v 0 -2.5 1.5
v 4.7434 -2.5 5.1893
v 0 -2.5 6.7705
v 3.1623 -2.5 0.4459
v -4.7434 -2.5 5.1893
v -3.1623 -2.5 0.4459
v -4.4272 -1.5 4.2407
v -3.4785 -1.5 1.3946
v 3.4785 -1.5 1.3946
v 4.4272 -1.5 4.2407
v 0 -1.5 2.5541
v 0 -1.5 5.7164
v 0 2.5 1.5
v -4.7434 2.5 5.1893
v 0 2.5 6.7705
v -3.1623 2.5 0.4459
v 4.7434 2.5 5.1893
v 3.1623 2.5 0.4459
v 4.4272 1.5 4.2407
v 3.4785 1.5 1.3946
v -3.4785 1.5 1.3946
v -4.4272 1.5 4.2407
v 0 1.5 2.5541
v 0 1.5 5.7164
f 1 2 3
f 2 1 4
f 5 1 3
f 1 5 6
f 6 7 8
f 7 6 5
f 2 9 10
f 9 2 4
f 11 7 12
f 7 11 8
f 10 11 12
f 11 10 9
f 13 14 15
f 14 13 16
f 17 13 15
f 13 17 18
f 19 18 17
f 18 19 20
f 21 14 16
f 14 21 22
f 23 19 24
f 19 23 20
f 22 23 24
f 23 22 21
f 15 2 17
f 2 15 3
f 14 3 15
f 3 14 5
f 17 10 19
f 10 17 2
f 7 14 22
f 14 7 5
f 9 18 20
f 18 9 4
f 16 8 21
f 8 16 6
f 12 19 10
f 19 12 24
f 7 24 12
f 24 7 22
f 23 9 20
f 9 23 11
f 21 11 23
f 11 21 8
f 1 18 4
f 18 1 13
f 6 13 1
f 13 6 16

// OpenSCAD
// file: s/u7038s01.scad
use <../../lib.scad>
function ldraw_lib__s__u7038s01() = [
// 0 ~Modulex Brick Angled 18  2 x  X Double - End
// 0 Name: s\u7038s01.dat
// 0 Author: Magnus Forsberg [MagFors]
// 0 !LDRAW_ORG Subpart UPDATE 2025-09
// 0 !LICENSE Licensed under CC BY 4.0 : see CAreadme.txt
// 
// 0 BFC CERTIFY CCW
  [0,"BFC","CERTIFY"],
  [0,"BFC","CCW"],
// 
// 0 !HISTORY 2025-09-29 [OrionP] Official Update 2025-09
// 
// 4 16 0 -16.9262 0 0 -3.75 0 7.905708 -1.114818 0 11.858545 -12.973363 0
  [4,16,0,-16.9262,0,0,-3.75,0,7.905708,-1.114818,0,11.858545,-12.973363,0],
// 4 16 -7.905708 -1.114818 0 0 -3.75 0 0 -16.9262 0 -11.858545 -12.973363 0
  [4,16,-7.905708,-1.114818,0,0,-3.75,0,0,-16.9262,0,-11.858545,-12.973363,0],
// 4 16 -11.067977 -10.601654 2.5 -8.696275 -3.486527 2.5 -7.905708 -1.114818 0 -11.858545 -12.973363 0
  [4,16,-11.067977,-10.601654,2.5,-8.696275,-3.486527,2.5,-7.905708,-1.114818,0,-11.858545,-12.973363,0],
// 4 16 7.905708 -1.114818 0 8.696275 -3.486527 2.5 11.067977 -10.601654 2.5 11.858545 -12.973363 0
  [4,16,7.905708,-1.114818,0,8.696275,-3.486527,2.5,11.067977,-10.601654,2.5,11.858545,-12.973363,0],
// 4 16 -11.067977 -10.601654 2.5 0 -14.290969 2.5 0 -6.385277 2.5 -8.696275 -3.486527 2.5
  [4,16,-11.067977,-10.601654,2.5,0,-14.290969,2.5,0,-6.385277,2.5,-8.696275,-3.486527,2.5],
// 4 16 0 -6.385277 2.5 0 -14.290969 2.5 11.067977 -10.601654 2.5 8.696275 -3.486527 2.5
  [4,16,0,-6.385277,2.5,0,-14.290969,2.5,11.067977,-10.601654,2.5,8.696275,-3.486527,2.5],
// 2 24 8.696275 -3.486527 2.5 11.067977 -10.601654 2.5
  [2,24,8.696275,-3.486527,2.5,11.067977,-10.601654,2.5],
// 2 24 -11.858545 -12.973363 0 -7.905708 -1.114818 0
  [2,24,-11.858545,-12.973363,0,-7.905708,-1.114818,0],
// 2 24 11.858545 -12.973363 0 7.905708 -1.114818 0
  [2,24,11.858545,-12.973363,0,7.905708,-1.114818,0],
// 2 24 7.905708 -1.114818 0 0 -3.75 0
  [2,24,7.905708,-1.114818,0,0,-3.75,0],
// 2 24 0 -6.385277 2.5 8.696275 -3.486527 2.5
  [2,24,0,-6.385277,2.5,8.696275,-3.486527,2.5],
// 2 24 0 -14.290969 2.5 -11.067977 -10.601654 2.5
  [2,24,0,-14.290969,2.5,-11.067977,-10.601654,2.5],
// 2 24 -8.696275 -3.486527 2.5 0 -6.385277 2.5
  [2,24,-8.696275,-3.486527,2.5,0,-6.385277,2.5],
// 2 24 -7.905708 -1.114818 0 0 -3.75 0
  [2,24,-7.905708,-1.114818,0,0,-3.75,0],
// 2 24 0 -14.290969 2.5 11.067977 -10.601654 2.5
  [2,24,0,-14.290969,2.5,11.067977,-10.601654,2.5],
// 2 24 0 -16.9262 0 -11.858545 -12.973363 0
  [2,24,0,-16.9262,0,-11.858545,-12.973363,0],
// 2 24 -8.696275 -3.486527 2.5 -11.067977 -10.601654 2.5
  [2,24,-8.696275,-3.486527,2.5,-11.067977,-10.601654,2.5],
// 2 24 0 -16.9262 0 11.858545 -12.973363 0
  [2,24,0,-16.9262,0,11.858545,-12.973363,0],
];
module ldraw_lib__s__u7038s01(step=0, col=false, unit=2/5, alt=false, line=0.2, solid=!$preview)
    makepoly(ldraw_lib__s__u7038s01(), step=step, col=col, unit=unit, alt=alt, line=line, solid=solid);
ldraw_lib__s__u7038s01(line=0.2);
// main file
use <../lib.scad>
use <s/u7038s01.scad>
function ldraw_lib__u7038() = [
// 0 Modulex Brick Angled 18  2 x  1 Double
// 0 Name: u7038.dat
// 0 Author: Magnus Forsberg [MagFors]
// 0 !LDRAW_ORG Part UPDATE 2025-09
// 0 !LICENSE Licensed under CC BY 4.0 : see CAreadme.txt
// 
// 0 !HELP 1 16 18.75 12.5 0 1 0 0 0 1 0 0 0 1 u7032.dat
// 0 !HELP 1 35 9.882 -7.044 0 0 .949 .316 0 .316 -.949 -1 0 0 u7000.dat
// 
// 0 BFC CERTIFY CCW
  [0,"BFC","CERTIFY"],
  [0,"BFC","CCW"],
// 
// 0 !KEYWORDS 18.4349 degree, Bricklink Mx2403A, Rebrickable 2403A, slope 1:3
// 
// 0 !HISTORY 2025-09-29 [OrionP] Official Update 2025-09
// 
// 1 16 0 0 -6.25 1 0 0 0 1 0 0 0 1 s\u7038s01.dat
  [1,16,0,0,-6.25,1,0,0,0,1,0,0,0,1, ldraw_lib__s__u7038s01()],
// 1 16 0 0 6.25 -1 0 0 0 1 0 0 0 -1 s\u7038s01.dat
  [1,16,0,0,6.25,-1,0,0,0,1,0,0,0,-1, ldraw_lib__s__u7038s01()],
// 
// 2 24 0 -16.9262 6.25 0 -16.9262 -6.25
  [2,24,0,-16.9262,6.25,0,-16.9262,-6.25],
// 2 24 -11.858545 -12.973363 -6.25 -11.858545 -12.973363 6.25
  [2,24,-11.858545,-12.973363,-6.25,-11.858545,-12.973363,6.25],
// 2 24 11.858545 -12.973363 -6.25 11.858545 -12.973363 6.25
  [2,24,11.858545,-12.973363,-6.25,11.858545,-12.973363,6.25],
// 2 24 0 -3.75 6.25 0 -3.75 -6.25
  [2,24,0,-3.75,6.25,0,-3.75,-6.25],
// 2 24 7.905708 -1.114818 -6.25 7.905708 -1.114818 6.25
  [2,24,7.905708,-1.114818,-6.25,7.905708,-1.114818,6.25],
// 2 24 -7.905708 -1.114818 -6.25 -7.905708 -1.114818 6.25
  [2,24,-7.905708,-1.114818,-6.25,-7.905708,-1.114818,6.25],
// 
// 2 24 0 -14.290969 3.75 0 -14.290969 -3.75
  [2,24,0,-14.290969,3.75,0,-14.290969,-3.75],
// 2 24 11.067977 -10.601654 3.75 11.067977 -10.601654 -3.75
  [2,24,11.067977,-10.601654,3.75,11.067977,-10.601654,-3.75],
// 2 24 -11.067977 -10.601654 3.75 -11.067977 -10.601654 -3.75
  [2,24,-11.067977,-10.601654,3.75,-11.067977,-10.601654,-3.75],
// 2 24 8.696275 -3.486527 3.75 8.696275 -3.486527 -3.75
  [2,24,8.696275,-3.486527,3.75,8.696275,-3.486527,-3.75],
// 2 24 -8.696275 -3.486527 3.75 -8.696275 -3.486527 -3.75
  [2,24,-8.696275,-3.486527,3.75,-8.696275,-3.486527,-3.75],
// 2 24 0 -6.385277 3.75 0 -6.385277 -3.75
  [2,24,0,-6.385277,3.75,0,-6.385277,-3.75],
// 
// 4 16 11.858545 -12.973363 6.25 0 -16.9262 6.25 0 -16.9262 -6.25 11.858545 -12.973363 -6.25
  [4,16,11.858545,-12.973363,6.25,0,-16.9262,6.25,0,-16.9262,-6.25,11.858545,-12.973363,-6.25],
// 4 16 -11.858545 -12.973363 6.25 -11.858545 -12.973363 -6.25 0 -16.9262 -6.25 0 -16.9262 6.25
  [4,16,-11.858545,-12.973363,6.25,-11.858545,-12.973363,-6.25,0,-16.9262,-6.25,0,-16.9262,6.25],
// 4 16 11.067977 -10.601654 3.75 11.858545 -12.973363 6.25 11.858545 -12.973363 -6.25 11.067977 -10.601654 -3.75
  [4,16,11.067977,-10.601654,3.75,11.858545,-12.973363,6.25,11.858545,-12.973363,-6.25,11.067977,-10.601654,-3.75],
// 4 16 -11.067977 -10.601654 3.75 -11.067977 -10.601654 -3.75 -11.858545 -12.973363 -6.25 -11.858545 -12.973363 6.25
  [4,16,-11.067977,-10.601654,3.75,-11.067977,-10.601654,-3.75,-11.858545,-12.973363,-6.25,-11.858545,-12.973363,6.25],
// 4 16 8.696275 -3.486527 3.75 8.696275 -3.486527 -3.75 7.905708 -1.114818 -6.25 7.905708 -1.114818 6.25
  [4,16,8.696275,-3.486527,3.75,8.696275,-3.486527,-3.75,7.905708,-1.114818,-6.25,7.905708,-1.114818,6.25],
// 4 16 -8.696275 -3.486527 3.75 -7.905708 -1.114818 6.25 -7.905708 -1.114818 -6.25 -8.696275 -3.486527 -3.75
  [4,16,-8.696275,-3.486527,3.75,-7.905708,-1.114818,6.25,-7.905708,-1.114818,-6.25,-8.696275,-3.486527,-3.75],
// 4 16 11.067977 -10.601654 3.75 11.067977 -10.601654 -3.75 0 -14.290969 -3.75 0 -14.290969 3.75
  [4,16,11.067977,-10.601654,3.75,11.067977,-10.601654,-3.75,0,-14.290969,-3.75,0,-14.290969,3.75],
// 4 16 -11.067977 -10.601654 3.75 0 -14.290969 3.75 0 -14.290969 -3.75 -11.067977 -10.601654 -3.75
  [4,16,-11.067977,-10.601654,3.75,0,-14.290969,3.75,0,-14.290969,-3.75,-11.067977,-10.601654,-3.75],
// 4 16 8.696275 -3.486527 3.75 0 -6.385277 3.75 0 -6.385277 -3.75 8.696275 -3.486527 -3.75
  [4,16,8.696275,-3.486527,3.75,0,-6.385277,3.75,0,-6.385277,-3.75,8.696275,-3.486527,-3.75],
// 4 16 -8.696275 -3.486527 3.75 -8.696275 -3.486527 -3.75 0 -6.385277 -3.75 0 -6.385277 3.75
  [4,16,-8.696275,-3.486527,3.75,-8.696275,-3.486527,-3.75,0,-6.385277,-3.75,0,-6.385277,3.75],
// 4 16 7.905708 -1.114818 6.25 7.905708 -1.114818 -6.25 0 -3.75 -6.25 0 -3.75 6.25
  [4,16,7.905708,-1.114818,6.25,7.905708,-1.114818,-6.25,0,-3.75,-6.25,0,-3.75,6.25],
// 4 16 -7.905708 -1.114818 6.25 0 -3.75 6.25 0 -3.75 -6.25 -7.905708 -1.114818 -6.25
  [4,16,-7.905708,-1.114818,6.25,0,-3.75,6.25,0,-3.75,-6.25,-7.905708,-1.114818,-6.25],
];
module ldraw_lib__u7038(step=0, col=false, unit=2/5, alt=false, line=0.2, solid=!$preview)
    makepoly(ldraw_lib__u7038(), step=step, col=col, unit=unit, alt=alt, line=line, solid=solid);
ldraw_lib__u7038(line=0.2);
